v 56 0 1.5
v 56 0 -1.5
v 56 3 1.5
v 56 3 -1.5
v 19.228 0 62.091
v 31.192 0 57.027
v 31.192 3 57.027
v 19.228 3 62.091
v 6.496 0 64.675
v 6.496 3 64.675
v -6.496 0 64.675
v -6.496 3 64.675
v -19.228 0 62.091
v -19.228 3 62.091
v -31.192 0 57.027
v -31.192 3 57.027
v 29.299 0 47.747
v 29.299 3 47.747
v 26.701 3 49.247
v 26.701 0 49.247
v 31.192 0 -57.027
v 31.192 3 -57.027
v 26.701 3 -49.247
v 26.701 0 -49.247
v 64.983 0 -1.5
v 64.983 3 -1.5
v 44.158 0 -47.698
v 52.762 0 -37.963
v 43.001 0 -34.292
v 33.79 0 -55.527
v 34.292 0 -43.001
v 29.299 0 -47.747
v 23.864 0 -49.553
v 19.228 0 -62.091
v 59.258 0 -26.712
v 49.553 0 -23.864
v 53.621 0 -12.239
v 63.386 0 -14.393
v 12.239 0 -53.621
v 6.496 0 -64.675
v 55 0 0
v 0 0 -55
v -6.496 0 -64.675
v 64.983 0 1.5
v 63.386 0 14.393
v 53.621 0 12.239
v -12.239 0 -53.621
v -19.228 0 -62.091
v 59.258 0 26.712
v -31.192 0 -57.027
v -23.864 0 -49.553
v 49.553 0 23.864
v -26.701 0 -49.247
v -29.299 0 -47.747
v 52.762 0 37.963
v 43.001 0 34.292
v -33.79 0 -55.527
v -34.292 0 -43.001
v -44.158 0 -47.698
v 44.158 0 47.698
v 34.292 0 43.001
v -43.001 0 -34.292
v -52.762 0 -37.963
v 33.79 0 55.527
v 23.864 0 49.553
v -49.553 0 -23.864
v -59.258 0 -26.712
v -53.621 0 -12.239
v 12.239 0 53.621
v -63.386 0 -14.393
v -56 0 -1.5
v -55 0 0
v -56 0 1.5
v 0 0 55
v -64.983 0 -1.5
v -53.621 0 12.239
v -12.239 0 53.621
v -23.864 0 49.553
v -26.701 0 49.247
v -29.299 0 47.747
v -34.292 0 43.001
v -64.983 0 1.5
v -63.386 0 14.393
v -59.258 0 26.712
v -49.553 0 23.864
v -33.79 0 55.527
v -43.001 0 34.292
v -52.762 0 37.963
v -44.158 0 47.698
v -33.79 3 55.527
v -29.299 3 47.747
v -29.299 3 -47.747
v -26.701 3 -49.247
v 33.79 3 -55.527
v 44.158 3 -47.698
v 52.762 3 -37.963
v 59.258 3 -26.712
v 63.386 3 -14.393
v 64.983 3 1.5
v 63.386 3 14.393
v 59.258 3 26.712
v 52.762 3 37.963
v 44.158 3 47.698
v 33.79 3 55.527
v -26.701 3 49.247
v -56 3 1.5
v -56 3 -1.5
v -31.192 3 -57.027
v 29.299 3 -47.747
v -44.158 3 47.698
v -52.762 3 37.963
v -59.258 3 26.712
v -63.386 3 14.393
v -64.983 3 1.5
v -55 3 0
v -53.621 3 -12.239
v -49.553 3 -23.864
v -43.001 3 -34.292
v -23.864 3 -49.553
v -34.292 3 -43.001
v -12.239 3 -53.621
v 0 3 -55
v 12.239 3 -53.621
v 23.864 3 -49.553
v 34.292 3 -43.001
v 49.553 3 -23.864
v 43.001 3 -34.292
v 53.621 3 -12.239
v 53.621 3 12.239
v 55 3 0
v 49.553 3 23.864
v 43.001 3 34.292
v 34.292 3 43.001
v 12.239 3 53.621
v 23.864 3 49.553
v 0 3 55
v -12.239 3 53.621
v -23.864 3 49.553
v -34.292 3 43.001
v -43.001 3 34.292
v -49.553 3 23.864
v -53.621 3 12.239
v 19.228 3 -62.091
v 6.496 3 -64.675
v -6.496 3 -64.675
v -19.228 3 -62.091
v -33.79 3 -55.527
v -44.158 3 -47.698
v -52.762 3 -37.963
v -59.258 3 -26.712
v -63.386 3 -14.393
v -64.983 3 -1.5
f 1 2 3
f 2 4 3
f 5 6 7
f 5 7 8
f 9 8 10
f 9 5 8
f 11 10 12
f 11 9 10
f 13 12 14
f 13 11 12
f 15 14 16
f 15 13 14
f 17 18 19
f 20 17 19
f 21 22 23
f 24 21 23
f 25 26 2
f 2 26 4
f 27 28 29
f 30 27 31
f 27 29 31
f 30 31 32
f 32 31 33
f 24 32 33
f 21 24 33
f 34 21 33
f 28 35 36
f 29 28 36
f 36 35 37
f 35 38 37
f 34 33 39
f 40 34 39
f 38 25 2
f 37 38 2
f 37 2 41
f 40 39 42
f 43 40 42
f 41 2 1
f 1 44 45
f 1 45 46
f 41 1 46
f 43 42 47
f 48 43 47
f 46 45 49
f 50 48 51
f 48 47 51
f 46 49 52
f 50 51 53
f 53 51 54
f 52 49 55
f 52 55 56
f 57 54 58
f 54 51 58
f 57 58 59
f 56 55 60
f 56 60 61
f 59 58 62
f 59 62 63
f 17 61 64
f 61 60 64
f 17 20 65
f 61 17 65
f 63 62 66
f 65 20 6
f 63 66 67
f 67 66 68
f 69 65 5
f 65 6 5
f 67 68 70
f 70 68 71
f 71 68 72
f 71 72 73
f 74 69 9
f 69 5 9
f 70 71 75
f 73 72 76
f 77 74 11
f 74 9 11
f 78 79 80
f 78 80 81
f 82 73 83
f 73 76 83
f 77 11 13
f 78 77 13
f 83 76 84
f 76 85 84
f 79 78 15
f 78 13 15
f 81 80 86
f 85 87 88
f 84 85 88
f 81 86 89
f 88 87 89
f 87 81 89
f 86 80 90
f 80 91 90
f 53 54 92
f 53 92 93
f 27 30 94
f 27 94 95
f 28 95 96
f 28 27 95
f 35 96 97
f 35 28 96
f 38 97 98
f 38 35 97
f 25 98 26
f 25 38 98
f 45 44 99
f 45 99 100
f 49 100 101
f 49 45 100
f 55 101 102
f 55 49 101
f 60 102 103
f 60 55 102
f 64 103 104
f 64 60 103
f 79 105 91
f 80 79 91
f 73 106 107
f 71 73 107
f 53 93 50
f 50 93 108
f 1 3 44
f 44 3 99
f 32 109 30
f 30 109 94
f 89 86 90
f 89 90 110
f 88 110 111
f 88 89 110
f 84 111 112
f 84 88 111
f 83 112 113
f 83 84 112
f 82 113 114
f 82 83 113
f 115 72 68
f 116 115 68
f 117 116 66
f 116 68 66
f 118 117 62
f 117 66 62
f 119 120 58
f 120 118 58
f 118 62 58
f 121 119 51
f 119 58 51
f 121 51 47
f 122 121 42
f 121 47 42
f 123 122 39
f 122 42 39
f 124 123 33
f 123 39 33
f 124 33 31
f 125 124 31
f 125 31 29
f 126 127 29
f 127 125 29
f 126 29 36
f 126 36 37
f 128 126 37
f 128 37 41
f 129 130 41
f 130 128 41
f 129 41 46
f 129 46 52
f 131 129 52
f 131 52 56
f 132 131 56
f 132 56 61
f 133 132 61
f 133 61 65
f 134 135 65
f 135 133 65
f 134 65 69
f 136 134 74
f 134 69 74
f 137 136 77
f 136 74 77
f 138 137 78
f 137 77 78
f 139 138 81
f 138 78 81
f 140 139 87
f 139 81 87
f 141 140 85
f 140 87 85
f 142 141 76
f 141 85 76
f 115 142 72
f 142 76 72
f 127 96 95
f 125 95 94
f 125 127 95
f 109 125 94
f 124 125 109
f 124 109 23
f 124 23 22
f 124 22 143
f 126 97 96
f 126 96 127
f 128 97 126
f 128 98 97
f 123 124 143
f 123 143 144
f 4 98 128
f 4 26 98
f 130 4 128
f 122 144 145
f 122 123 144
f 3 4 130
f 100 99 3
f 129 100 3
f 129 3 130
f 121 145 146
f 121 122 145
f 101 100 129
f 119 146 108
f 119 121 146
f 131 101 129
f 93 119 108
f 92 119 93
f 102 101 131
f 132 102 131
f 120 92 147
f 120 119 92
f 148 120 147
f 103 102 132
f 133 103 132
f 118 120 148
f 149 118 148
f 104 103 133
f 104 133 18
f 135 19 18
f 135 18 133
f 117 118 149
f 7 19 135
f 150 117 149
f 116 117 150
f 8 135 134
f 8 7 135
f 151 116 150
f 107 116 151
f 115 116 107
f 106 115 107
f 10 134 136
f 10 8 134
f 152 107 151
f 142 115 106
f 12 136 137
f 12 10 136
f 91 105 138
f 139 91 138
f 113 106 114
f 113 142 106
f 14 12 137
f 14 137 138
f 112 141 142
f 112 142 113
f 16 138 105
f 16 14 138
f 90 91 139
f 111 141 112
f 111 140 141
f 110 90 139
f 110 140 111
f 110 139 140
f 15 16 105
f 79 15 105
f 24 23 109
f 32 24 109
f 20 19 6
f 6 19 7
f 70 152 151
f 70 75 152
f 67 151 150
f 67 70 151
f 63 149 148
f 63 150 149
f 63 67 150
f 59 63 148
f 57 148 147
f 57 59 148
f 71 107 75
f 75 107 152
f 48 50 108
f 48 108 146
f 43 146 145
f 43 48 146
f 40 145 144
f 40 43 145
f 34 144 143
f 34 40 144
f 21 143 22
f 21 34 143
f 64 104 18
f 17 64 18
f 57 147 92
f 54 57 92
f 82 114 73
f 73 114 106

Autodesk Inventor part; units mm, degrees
ref_plane "YZ Plane" through (0, 0, 0) normal (1, 0, 0) x (0, 1, 0)
ref_plane "XZ Plane" through (0, 0, 0) normal (0, 1, 0) x (-1, 0, 0)
ref_plane "XY Plane" through (0, 0, 0) normal (0, 0, 1) x (1, 0, 0)
sketch "Sketch1" plane through (0, 0, 0) normal (0, 1, 0) x (-1, 0, 0)
  circle A0 centre (0, 0) radius 65
  circle A1 centre (0, 0) radius 55
  dimension "d0" = 130
  dimension "d1" = 110
extrude "Extrusion1" add sketch "Sketch1" along normal blind 3
sketch "Sketch2" plane through (0, 3, 0) normal (0, 1, 0) x (1, 0, 0)
  line L0 (-65, -1.5) -> (-56, -1.5)
  line L1 (-56, -1.5) -> (-56, 1.5)
  line L2 (-56, 1.5) -> (-65, 1.5)
  line L3 (-65, 1.5) -> (-65, -1.5)
  point P0 (0, 0)
  dimension "d4" = 3
  dimension "d5" = 9
  dimension "d6" = 1.5
  dimension "d7" = 65
extrude "Extrusion2" cut sketch "Sketch2" against normal blind 10
pattern_circular "Circular Pattern1" count 6 over 360 about axis through (0, -10, 0) along (0, 1, 0) of "Extrusion2"
properties part number "os"
